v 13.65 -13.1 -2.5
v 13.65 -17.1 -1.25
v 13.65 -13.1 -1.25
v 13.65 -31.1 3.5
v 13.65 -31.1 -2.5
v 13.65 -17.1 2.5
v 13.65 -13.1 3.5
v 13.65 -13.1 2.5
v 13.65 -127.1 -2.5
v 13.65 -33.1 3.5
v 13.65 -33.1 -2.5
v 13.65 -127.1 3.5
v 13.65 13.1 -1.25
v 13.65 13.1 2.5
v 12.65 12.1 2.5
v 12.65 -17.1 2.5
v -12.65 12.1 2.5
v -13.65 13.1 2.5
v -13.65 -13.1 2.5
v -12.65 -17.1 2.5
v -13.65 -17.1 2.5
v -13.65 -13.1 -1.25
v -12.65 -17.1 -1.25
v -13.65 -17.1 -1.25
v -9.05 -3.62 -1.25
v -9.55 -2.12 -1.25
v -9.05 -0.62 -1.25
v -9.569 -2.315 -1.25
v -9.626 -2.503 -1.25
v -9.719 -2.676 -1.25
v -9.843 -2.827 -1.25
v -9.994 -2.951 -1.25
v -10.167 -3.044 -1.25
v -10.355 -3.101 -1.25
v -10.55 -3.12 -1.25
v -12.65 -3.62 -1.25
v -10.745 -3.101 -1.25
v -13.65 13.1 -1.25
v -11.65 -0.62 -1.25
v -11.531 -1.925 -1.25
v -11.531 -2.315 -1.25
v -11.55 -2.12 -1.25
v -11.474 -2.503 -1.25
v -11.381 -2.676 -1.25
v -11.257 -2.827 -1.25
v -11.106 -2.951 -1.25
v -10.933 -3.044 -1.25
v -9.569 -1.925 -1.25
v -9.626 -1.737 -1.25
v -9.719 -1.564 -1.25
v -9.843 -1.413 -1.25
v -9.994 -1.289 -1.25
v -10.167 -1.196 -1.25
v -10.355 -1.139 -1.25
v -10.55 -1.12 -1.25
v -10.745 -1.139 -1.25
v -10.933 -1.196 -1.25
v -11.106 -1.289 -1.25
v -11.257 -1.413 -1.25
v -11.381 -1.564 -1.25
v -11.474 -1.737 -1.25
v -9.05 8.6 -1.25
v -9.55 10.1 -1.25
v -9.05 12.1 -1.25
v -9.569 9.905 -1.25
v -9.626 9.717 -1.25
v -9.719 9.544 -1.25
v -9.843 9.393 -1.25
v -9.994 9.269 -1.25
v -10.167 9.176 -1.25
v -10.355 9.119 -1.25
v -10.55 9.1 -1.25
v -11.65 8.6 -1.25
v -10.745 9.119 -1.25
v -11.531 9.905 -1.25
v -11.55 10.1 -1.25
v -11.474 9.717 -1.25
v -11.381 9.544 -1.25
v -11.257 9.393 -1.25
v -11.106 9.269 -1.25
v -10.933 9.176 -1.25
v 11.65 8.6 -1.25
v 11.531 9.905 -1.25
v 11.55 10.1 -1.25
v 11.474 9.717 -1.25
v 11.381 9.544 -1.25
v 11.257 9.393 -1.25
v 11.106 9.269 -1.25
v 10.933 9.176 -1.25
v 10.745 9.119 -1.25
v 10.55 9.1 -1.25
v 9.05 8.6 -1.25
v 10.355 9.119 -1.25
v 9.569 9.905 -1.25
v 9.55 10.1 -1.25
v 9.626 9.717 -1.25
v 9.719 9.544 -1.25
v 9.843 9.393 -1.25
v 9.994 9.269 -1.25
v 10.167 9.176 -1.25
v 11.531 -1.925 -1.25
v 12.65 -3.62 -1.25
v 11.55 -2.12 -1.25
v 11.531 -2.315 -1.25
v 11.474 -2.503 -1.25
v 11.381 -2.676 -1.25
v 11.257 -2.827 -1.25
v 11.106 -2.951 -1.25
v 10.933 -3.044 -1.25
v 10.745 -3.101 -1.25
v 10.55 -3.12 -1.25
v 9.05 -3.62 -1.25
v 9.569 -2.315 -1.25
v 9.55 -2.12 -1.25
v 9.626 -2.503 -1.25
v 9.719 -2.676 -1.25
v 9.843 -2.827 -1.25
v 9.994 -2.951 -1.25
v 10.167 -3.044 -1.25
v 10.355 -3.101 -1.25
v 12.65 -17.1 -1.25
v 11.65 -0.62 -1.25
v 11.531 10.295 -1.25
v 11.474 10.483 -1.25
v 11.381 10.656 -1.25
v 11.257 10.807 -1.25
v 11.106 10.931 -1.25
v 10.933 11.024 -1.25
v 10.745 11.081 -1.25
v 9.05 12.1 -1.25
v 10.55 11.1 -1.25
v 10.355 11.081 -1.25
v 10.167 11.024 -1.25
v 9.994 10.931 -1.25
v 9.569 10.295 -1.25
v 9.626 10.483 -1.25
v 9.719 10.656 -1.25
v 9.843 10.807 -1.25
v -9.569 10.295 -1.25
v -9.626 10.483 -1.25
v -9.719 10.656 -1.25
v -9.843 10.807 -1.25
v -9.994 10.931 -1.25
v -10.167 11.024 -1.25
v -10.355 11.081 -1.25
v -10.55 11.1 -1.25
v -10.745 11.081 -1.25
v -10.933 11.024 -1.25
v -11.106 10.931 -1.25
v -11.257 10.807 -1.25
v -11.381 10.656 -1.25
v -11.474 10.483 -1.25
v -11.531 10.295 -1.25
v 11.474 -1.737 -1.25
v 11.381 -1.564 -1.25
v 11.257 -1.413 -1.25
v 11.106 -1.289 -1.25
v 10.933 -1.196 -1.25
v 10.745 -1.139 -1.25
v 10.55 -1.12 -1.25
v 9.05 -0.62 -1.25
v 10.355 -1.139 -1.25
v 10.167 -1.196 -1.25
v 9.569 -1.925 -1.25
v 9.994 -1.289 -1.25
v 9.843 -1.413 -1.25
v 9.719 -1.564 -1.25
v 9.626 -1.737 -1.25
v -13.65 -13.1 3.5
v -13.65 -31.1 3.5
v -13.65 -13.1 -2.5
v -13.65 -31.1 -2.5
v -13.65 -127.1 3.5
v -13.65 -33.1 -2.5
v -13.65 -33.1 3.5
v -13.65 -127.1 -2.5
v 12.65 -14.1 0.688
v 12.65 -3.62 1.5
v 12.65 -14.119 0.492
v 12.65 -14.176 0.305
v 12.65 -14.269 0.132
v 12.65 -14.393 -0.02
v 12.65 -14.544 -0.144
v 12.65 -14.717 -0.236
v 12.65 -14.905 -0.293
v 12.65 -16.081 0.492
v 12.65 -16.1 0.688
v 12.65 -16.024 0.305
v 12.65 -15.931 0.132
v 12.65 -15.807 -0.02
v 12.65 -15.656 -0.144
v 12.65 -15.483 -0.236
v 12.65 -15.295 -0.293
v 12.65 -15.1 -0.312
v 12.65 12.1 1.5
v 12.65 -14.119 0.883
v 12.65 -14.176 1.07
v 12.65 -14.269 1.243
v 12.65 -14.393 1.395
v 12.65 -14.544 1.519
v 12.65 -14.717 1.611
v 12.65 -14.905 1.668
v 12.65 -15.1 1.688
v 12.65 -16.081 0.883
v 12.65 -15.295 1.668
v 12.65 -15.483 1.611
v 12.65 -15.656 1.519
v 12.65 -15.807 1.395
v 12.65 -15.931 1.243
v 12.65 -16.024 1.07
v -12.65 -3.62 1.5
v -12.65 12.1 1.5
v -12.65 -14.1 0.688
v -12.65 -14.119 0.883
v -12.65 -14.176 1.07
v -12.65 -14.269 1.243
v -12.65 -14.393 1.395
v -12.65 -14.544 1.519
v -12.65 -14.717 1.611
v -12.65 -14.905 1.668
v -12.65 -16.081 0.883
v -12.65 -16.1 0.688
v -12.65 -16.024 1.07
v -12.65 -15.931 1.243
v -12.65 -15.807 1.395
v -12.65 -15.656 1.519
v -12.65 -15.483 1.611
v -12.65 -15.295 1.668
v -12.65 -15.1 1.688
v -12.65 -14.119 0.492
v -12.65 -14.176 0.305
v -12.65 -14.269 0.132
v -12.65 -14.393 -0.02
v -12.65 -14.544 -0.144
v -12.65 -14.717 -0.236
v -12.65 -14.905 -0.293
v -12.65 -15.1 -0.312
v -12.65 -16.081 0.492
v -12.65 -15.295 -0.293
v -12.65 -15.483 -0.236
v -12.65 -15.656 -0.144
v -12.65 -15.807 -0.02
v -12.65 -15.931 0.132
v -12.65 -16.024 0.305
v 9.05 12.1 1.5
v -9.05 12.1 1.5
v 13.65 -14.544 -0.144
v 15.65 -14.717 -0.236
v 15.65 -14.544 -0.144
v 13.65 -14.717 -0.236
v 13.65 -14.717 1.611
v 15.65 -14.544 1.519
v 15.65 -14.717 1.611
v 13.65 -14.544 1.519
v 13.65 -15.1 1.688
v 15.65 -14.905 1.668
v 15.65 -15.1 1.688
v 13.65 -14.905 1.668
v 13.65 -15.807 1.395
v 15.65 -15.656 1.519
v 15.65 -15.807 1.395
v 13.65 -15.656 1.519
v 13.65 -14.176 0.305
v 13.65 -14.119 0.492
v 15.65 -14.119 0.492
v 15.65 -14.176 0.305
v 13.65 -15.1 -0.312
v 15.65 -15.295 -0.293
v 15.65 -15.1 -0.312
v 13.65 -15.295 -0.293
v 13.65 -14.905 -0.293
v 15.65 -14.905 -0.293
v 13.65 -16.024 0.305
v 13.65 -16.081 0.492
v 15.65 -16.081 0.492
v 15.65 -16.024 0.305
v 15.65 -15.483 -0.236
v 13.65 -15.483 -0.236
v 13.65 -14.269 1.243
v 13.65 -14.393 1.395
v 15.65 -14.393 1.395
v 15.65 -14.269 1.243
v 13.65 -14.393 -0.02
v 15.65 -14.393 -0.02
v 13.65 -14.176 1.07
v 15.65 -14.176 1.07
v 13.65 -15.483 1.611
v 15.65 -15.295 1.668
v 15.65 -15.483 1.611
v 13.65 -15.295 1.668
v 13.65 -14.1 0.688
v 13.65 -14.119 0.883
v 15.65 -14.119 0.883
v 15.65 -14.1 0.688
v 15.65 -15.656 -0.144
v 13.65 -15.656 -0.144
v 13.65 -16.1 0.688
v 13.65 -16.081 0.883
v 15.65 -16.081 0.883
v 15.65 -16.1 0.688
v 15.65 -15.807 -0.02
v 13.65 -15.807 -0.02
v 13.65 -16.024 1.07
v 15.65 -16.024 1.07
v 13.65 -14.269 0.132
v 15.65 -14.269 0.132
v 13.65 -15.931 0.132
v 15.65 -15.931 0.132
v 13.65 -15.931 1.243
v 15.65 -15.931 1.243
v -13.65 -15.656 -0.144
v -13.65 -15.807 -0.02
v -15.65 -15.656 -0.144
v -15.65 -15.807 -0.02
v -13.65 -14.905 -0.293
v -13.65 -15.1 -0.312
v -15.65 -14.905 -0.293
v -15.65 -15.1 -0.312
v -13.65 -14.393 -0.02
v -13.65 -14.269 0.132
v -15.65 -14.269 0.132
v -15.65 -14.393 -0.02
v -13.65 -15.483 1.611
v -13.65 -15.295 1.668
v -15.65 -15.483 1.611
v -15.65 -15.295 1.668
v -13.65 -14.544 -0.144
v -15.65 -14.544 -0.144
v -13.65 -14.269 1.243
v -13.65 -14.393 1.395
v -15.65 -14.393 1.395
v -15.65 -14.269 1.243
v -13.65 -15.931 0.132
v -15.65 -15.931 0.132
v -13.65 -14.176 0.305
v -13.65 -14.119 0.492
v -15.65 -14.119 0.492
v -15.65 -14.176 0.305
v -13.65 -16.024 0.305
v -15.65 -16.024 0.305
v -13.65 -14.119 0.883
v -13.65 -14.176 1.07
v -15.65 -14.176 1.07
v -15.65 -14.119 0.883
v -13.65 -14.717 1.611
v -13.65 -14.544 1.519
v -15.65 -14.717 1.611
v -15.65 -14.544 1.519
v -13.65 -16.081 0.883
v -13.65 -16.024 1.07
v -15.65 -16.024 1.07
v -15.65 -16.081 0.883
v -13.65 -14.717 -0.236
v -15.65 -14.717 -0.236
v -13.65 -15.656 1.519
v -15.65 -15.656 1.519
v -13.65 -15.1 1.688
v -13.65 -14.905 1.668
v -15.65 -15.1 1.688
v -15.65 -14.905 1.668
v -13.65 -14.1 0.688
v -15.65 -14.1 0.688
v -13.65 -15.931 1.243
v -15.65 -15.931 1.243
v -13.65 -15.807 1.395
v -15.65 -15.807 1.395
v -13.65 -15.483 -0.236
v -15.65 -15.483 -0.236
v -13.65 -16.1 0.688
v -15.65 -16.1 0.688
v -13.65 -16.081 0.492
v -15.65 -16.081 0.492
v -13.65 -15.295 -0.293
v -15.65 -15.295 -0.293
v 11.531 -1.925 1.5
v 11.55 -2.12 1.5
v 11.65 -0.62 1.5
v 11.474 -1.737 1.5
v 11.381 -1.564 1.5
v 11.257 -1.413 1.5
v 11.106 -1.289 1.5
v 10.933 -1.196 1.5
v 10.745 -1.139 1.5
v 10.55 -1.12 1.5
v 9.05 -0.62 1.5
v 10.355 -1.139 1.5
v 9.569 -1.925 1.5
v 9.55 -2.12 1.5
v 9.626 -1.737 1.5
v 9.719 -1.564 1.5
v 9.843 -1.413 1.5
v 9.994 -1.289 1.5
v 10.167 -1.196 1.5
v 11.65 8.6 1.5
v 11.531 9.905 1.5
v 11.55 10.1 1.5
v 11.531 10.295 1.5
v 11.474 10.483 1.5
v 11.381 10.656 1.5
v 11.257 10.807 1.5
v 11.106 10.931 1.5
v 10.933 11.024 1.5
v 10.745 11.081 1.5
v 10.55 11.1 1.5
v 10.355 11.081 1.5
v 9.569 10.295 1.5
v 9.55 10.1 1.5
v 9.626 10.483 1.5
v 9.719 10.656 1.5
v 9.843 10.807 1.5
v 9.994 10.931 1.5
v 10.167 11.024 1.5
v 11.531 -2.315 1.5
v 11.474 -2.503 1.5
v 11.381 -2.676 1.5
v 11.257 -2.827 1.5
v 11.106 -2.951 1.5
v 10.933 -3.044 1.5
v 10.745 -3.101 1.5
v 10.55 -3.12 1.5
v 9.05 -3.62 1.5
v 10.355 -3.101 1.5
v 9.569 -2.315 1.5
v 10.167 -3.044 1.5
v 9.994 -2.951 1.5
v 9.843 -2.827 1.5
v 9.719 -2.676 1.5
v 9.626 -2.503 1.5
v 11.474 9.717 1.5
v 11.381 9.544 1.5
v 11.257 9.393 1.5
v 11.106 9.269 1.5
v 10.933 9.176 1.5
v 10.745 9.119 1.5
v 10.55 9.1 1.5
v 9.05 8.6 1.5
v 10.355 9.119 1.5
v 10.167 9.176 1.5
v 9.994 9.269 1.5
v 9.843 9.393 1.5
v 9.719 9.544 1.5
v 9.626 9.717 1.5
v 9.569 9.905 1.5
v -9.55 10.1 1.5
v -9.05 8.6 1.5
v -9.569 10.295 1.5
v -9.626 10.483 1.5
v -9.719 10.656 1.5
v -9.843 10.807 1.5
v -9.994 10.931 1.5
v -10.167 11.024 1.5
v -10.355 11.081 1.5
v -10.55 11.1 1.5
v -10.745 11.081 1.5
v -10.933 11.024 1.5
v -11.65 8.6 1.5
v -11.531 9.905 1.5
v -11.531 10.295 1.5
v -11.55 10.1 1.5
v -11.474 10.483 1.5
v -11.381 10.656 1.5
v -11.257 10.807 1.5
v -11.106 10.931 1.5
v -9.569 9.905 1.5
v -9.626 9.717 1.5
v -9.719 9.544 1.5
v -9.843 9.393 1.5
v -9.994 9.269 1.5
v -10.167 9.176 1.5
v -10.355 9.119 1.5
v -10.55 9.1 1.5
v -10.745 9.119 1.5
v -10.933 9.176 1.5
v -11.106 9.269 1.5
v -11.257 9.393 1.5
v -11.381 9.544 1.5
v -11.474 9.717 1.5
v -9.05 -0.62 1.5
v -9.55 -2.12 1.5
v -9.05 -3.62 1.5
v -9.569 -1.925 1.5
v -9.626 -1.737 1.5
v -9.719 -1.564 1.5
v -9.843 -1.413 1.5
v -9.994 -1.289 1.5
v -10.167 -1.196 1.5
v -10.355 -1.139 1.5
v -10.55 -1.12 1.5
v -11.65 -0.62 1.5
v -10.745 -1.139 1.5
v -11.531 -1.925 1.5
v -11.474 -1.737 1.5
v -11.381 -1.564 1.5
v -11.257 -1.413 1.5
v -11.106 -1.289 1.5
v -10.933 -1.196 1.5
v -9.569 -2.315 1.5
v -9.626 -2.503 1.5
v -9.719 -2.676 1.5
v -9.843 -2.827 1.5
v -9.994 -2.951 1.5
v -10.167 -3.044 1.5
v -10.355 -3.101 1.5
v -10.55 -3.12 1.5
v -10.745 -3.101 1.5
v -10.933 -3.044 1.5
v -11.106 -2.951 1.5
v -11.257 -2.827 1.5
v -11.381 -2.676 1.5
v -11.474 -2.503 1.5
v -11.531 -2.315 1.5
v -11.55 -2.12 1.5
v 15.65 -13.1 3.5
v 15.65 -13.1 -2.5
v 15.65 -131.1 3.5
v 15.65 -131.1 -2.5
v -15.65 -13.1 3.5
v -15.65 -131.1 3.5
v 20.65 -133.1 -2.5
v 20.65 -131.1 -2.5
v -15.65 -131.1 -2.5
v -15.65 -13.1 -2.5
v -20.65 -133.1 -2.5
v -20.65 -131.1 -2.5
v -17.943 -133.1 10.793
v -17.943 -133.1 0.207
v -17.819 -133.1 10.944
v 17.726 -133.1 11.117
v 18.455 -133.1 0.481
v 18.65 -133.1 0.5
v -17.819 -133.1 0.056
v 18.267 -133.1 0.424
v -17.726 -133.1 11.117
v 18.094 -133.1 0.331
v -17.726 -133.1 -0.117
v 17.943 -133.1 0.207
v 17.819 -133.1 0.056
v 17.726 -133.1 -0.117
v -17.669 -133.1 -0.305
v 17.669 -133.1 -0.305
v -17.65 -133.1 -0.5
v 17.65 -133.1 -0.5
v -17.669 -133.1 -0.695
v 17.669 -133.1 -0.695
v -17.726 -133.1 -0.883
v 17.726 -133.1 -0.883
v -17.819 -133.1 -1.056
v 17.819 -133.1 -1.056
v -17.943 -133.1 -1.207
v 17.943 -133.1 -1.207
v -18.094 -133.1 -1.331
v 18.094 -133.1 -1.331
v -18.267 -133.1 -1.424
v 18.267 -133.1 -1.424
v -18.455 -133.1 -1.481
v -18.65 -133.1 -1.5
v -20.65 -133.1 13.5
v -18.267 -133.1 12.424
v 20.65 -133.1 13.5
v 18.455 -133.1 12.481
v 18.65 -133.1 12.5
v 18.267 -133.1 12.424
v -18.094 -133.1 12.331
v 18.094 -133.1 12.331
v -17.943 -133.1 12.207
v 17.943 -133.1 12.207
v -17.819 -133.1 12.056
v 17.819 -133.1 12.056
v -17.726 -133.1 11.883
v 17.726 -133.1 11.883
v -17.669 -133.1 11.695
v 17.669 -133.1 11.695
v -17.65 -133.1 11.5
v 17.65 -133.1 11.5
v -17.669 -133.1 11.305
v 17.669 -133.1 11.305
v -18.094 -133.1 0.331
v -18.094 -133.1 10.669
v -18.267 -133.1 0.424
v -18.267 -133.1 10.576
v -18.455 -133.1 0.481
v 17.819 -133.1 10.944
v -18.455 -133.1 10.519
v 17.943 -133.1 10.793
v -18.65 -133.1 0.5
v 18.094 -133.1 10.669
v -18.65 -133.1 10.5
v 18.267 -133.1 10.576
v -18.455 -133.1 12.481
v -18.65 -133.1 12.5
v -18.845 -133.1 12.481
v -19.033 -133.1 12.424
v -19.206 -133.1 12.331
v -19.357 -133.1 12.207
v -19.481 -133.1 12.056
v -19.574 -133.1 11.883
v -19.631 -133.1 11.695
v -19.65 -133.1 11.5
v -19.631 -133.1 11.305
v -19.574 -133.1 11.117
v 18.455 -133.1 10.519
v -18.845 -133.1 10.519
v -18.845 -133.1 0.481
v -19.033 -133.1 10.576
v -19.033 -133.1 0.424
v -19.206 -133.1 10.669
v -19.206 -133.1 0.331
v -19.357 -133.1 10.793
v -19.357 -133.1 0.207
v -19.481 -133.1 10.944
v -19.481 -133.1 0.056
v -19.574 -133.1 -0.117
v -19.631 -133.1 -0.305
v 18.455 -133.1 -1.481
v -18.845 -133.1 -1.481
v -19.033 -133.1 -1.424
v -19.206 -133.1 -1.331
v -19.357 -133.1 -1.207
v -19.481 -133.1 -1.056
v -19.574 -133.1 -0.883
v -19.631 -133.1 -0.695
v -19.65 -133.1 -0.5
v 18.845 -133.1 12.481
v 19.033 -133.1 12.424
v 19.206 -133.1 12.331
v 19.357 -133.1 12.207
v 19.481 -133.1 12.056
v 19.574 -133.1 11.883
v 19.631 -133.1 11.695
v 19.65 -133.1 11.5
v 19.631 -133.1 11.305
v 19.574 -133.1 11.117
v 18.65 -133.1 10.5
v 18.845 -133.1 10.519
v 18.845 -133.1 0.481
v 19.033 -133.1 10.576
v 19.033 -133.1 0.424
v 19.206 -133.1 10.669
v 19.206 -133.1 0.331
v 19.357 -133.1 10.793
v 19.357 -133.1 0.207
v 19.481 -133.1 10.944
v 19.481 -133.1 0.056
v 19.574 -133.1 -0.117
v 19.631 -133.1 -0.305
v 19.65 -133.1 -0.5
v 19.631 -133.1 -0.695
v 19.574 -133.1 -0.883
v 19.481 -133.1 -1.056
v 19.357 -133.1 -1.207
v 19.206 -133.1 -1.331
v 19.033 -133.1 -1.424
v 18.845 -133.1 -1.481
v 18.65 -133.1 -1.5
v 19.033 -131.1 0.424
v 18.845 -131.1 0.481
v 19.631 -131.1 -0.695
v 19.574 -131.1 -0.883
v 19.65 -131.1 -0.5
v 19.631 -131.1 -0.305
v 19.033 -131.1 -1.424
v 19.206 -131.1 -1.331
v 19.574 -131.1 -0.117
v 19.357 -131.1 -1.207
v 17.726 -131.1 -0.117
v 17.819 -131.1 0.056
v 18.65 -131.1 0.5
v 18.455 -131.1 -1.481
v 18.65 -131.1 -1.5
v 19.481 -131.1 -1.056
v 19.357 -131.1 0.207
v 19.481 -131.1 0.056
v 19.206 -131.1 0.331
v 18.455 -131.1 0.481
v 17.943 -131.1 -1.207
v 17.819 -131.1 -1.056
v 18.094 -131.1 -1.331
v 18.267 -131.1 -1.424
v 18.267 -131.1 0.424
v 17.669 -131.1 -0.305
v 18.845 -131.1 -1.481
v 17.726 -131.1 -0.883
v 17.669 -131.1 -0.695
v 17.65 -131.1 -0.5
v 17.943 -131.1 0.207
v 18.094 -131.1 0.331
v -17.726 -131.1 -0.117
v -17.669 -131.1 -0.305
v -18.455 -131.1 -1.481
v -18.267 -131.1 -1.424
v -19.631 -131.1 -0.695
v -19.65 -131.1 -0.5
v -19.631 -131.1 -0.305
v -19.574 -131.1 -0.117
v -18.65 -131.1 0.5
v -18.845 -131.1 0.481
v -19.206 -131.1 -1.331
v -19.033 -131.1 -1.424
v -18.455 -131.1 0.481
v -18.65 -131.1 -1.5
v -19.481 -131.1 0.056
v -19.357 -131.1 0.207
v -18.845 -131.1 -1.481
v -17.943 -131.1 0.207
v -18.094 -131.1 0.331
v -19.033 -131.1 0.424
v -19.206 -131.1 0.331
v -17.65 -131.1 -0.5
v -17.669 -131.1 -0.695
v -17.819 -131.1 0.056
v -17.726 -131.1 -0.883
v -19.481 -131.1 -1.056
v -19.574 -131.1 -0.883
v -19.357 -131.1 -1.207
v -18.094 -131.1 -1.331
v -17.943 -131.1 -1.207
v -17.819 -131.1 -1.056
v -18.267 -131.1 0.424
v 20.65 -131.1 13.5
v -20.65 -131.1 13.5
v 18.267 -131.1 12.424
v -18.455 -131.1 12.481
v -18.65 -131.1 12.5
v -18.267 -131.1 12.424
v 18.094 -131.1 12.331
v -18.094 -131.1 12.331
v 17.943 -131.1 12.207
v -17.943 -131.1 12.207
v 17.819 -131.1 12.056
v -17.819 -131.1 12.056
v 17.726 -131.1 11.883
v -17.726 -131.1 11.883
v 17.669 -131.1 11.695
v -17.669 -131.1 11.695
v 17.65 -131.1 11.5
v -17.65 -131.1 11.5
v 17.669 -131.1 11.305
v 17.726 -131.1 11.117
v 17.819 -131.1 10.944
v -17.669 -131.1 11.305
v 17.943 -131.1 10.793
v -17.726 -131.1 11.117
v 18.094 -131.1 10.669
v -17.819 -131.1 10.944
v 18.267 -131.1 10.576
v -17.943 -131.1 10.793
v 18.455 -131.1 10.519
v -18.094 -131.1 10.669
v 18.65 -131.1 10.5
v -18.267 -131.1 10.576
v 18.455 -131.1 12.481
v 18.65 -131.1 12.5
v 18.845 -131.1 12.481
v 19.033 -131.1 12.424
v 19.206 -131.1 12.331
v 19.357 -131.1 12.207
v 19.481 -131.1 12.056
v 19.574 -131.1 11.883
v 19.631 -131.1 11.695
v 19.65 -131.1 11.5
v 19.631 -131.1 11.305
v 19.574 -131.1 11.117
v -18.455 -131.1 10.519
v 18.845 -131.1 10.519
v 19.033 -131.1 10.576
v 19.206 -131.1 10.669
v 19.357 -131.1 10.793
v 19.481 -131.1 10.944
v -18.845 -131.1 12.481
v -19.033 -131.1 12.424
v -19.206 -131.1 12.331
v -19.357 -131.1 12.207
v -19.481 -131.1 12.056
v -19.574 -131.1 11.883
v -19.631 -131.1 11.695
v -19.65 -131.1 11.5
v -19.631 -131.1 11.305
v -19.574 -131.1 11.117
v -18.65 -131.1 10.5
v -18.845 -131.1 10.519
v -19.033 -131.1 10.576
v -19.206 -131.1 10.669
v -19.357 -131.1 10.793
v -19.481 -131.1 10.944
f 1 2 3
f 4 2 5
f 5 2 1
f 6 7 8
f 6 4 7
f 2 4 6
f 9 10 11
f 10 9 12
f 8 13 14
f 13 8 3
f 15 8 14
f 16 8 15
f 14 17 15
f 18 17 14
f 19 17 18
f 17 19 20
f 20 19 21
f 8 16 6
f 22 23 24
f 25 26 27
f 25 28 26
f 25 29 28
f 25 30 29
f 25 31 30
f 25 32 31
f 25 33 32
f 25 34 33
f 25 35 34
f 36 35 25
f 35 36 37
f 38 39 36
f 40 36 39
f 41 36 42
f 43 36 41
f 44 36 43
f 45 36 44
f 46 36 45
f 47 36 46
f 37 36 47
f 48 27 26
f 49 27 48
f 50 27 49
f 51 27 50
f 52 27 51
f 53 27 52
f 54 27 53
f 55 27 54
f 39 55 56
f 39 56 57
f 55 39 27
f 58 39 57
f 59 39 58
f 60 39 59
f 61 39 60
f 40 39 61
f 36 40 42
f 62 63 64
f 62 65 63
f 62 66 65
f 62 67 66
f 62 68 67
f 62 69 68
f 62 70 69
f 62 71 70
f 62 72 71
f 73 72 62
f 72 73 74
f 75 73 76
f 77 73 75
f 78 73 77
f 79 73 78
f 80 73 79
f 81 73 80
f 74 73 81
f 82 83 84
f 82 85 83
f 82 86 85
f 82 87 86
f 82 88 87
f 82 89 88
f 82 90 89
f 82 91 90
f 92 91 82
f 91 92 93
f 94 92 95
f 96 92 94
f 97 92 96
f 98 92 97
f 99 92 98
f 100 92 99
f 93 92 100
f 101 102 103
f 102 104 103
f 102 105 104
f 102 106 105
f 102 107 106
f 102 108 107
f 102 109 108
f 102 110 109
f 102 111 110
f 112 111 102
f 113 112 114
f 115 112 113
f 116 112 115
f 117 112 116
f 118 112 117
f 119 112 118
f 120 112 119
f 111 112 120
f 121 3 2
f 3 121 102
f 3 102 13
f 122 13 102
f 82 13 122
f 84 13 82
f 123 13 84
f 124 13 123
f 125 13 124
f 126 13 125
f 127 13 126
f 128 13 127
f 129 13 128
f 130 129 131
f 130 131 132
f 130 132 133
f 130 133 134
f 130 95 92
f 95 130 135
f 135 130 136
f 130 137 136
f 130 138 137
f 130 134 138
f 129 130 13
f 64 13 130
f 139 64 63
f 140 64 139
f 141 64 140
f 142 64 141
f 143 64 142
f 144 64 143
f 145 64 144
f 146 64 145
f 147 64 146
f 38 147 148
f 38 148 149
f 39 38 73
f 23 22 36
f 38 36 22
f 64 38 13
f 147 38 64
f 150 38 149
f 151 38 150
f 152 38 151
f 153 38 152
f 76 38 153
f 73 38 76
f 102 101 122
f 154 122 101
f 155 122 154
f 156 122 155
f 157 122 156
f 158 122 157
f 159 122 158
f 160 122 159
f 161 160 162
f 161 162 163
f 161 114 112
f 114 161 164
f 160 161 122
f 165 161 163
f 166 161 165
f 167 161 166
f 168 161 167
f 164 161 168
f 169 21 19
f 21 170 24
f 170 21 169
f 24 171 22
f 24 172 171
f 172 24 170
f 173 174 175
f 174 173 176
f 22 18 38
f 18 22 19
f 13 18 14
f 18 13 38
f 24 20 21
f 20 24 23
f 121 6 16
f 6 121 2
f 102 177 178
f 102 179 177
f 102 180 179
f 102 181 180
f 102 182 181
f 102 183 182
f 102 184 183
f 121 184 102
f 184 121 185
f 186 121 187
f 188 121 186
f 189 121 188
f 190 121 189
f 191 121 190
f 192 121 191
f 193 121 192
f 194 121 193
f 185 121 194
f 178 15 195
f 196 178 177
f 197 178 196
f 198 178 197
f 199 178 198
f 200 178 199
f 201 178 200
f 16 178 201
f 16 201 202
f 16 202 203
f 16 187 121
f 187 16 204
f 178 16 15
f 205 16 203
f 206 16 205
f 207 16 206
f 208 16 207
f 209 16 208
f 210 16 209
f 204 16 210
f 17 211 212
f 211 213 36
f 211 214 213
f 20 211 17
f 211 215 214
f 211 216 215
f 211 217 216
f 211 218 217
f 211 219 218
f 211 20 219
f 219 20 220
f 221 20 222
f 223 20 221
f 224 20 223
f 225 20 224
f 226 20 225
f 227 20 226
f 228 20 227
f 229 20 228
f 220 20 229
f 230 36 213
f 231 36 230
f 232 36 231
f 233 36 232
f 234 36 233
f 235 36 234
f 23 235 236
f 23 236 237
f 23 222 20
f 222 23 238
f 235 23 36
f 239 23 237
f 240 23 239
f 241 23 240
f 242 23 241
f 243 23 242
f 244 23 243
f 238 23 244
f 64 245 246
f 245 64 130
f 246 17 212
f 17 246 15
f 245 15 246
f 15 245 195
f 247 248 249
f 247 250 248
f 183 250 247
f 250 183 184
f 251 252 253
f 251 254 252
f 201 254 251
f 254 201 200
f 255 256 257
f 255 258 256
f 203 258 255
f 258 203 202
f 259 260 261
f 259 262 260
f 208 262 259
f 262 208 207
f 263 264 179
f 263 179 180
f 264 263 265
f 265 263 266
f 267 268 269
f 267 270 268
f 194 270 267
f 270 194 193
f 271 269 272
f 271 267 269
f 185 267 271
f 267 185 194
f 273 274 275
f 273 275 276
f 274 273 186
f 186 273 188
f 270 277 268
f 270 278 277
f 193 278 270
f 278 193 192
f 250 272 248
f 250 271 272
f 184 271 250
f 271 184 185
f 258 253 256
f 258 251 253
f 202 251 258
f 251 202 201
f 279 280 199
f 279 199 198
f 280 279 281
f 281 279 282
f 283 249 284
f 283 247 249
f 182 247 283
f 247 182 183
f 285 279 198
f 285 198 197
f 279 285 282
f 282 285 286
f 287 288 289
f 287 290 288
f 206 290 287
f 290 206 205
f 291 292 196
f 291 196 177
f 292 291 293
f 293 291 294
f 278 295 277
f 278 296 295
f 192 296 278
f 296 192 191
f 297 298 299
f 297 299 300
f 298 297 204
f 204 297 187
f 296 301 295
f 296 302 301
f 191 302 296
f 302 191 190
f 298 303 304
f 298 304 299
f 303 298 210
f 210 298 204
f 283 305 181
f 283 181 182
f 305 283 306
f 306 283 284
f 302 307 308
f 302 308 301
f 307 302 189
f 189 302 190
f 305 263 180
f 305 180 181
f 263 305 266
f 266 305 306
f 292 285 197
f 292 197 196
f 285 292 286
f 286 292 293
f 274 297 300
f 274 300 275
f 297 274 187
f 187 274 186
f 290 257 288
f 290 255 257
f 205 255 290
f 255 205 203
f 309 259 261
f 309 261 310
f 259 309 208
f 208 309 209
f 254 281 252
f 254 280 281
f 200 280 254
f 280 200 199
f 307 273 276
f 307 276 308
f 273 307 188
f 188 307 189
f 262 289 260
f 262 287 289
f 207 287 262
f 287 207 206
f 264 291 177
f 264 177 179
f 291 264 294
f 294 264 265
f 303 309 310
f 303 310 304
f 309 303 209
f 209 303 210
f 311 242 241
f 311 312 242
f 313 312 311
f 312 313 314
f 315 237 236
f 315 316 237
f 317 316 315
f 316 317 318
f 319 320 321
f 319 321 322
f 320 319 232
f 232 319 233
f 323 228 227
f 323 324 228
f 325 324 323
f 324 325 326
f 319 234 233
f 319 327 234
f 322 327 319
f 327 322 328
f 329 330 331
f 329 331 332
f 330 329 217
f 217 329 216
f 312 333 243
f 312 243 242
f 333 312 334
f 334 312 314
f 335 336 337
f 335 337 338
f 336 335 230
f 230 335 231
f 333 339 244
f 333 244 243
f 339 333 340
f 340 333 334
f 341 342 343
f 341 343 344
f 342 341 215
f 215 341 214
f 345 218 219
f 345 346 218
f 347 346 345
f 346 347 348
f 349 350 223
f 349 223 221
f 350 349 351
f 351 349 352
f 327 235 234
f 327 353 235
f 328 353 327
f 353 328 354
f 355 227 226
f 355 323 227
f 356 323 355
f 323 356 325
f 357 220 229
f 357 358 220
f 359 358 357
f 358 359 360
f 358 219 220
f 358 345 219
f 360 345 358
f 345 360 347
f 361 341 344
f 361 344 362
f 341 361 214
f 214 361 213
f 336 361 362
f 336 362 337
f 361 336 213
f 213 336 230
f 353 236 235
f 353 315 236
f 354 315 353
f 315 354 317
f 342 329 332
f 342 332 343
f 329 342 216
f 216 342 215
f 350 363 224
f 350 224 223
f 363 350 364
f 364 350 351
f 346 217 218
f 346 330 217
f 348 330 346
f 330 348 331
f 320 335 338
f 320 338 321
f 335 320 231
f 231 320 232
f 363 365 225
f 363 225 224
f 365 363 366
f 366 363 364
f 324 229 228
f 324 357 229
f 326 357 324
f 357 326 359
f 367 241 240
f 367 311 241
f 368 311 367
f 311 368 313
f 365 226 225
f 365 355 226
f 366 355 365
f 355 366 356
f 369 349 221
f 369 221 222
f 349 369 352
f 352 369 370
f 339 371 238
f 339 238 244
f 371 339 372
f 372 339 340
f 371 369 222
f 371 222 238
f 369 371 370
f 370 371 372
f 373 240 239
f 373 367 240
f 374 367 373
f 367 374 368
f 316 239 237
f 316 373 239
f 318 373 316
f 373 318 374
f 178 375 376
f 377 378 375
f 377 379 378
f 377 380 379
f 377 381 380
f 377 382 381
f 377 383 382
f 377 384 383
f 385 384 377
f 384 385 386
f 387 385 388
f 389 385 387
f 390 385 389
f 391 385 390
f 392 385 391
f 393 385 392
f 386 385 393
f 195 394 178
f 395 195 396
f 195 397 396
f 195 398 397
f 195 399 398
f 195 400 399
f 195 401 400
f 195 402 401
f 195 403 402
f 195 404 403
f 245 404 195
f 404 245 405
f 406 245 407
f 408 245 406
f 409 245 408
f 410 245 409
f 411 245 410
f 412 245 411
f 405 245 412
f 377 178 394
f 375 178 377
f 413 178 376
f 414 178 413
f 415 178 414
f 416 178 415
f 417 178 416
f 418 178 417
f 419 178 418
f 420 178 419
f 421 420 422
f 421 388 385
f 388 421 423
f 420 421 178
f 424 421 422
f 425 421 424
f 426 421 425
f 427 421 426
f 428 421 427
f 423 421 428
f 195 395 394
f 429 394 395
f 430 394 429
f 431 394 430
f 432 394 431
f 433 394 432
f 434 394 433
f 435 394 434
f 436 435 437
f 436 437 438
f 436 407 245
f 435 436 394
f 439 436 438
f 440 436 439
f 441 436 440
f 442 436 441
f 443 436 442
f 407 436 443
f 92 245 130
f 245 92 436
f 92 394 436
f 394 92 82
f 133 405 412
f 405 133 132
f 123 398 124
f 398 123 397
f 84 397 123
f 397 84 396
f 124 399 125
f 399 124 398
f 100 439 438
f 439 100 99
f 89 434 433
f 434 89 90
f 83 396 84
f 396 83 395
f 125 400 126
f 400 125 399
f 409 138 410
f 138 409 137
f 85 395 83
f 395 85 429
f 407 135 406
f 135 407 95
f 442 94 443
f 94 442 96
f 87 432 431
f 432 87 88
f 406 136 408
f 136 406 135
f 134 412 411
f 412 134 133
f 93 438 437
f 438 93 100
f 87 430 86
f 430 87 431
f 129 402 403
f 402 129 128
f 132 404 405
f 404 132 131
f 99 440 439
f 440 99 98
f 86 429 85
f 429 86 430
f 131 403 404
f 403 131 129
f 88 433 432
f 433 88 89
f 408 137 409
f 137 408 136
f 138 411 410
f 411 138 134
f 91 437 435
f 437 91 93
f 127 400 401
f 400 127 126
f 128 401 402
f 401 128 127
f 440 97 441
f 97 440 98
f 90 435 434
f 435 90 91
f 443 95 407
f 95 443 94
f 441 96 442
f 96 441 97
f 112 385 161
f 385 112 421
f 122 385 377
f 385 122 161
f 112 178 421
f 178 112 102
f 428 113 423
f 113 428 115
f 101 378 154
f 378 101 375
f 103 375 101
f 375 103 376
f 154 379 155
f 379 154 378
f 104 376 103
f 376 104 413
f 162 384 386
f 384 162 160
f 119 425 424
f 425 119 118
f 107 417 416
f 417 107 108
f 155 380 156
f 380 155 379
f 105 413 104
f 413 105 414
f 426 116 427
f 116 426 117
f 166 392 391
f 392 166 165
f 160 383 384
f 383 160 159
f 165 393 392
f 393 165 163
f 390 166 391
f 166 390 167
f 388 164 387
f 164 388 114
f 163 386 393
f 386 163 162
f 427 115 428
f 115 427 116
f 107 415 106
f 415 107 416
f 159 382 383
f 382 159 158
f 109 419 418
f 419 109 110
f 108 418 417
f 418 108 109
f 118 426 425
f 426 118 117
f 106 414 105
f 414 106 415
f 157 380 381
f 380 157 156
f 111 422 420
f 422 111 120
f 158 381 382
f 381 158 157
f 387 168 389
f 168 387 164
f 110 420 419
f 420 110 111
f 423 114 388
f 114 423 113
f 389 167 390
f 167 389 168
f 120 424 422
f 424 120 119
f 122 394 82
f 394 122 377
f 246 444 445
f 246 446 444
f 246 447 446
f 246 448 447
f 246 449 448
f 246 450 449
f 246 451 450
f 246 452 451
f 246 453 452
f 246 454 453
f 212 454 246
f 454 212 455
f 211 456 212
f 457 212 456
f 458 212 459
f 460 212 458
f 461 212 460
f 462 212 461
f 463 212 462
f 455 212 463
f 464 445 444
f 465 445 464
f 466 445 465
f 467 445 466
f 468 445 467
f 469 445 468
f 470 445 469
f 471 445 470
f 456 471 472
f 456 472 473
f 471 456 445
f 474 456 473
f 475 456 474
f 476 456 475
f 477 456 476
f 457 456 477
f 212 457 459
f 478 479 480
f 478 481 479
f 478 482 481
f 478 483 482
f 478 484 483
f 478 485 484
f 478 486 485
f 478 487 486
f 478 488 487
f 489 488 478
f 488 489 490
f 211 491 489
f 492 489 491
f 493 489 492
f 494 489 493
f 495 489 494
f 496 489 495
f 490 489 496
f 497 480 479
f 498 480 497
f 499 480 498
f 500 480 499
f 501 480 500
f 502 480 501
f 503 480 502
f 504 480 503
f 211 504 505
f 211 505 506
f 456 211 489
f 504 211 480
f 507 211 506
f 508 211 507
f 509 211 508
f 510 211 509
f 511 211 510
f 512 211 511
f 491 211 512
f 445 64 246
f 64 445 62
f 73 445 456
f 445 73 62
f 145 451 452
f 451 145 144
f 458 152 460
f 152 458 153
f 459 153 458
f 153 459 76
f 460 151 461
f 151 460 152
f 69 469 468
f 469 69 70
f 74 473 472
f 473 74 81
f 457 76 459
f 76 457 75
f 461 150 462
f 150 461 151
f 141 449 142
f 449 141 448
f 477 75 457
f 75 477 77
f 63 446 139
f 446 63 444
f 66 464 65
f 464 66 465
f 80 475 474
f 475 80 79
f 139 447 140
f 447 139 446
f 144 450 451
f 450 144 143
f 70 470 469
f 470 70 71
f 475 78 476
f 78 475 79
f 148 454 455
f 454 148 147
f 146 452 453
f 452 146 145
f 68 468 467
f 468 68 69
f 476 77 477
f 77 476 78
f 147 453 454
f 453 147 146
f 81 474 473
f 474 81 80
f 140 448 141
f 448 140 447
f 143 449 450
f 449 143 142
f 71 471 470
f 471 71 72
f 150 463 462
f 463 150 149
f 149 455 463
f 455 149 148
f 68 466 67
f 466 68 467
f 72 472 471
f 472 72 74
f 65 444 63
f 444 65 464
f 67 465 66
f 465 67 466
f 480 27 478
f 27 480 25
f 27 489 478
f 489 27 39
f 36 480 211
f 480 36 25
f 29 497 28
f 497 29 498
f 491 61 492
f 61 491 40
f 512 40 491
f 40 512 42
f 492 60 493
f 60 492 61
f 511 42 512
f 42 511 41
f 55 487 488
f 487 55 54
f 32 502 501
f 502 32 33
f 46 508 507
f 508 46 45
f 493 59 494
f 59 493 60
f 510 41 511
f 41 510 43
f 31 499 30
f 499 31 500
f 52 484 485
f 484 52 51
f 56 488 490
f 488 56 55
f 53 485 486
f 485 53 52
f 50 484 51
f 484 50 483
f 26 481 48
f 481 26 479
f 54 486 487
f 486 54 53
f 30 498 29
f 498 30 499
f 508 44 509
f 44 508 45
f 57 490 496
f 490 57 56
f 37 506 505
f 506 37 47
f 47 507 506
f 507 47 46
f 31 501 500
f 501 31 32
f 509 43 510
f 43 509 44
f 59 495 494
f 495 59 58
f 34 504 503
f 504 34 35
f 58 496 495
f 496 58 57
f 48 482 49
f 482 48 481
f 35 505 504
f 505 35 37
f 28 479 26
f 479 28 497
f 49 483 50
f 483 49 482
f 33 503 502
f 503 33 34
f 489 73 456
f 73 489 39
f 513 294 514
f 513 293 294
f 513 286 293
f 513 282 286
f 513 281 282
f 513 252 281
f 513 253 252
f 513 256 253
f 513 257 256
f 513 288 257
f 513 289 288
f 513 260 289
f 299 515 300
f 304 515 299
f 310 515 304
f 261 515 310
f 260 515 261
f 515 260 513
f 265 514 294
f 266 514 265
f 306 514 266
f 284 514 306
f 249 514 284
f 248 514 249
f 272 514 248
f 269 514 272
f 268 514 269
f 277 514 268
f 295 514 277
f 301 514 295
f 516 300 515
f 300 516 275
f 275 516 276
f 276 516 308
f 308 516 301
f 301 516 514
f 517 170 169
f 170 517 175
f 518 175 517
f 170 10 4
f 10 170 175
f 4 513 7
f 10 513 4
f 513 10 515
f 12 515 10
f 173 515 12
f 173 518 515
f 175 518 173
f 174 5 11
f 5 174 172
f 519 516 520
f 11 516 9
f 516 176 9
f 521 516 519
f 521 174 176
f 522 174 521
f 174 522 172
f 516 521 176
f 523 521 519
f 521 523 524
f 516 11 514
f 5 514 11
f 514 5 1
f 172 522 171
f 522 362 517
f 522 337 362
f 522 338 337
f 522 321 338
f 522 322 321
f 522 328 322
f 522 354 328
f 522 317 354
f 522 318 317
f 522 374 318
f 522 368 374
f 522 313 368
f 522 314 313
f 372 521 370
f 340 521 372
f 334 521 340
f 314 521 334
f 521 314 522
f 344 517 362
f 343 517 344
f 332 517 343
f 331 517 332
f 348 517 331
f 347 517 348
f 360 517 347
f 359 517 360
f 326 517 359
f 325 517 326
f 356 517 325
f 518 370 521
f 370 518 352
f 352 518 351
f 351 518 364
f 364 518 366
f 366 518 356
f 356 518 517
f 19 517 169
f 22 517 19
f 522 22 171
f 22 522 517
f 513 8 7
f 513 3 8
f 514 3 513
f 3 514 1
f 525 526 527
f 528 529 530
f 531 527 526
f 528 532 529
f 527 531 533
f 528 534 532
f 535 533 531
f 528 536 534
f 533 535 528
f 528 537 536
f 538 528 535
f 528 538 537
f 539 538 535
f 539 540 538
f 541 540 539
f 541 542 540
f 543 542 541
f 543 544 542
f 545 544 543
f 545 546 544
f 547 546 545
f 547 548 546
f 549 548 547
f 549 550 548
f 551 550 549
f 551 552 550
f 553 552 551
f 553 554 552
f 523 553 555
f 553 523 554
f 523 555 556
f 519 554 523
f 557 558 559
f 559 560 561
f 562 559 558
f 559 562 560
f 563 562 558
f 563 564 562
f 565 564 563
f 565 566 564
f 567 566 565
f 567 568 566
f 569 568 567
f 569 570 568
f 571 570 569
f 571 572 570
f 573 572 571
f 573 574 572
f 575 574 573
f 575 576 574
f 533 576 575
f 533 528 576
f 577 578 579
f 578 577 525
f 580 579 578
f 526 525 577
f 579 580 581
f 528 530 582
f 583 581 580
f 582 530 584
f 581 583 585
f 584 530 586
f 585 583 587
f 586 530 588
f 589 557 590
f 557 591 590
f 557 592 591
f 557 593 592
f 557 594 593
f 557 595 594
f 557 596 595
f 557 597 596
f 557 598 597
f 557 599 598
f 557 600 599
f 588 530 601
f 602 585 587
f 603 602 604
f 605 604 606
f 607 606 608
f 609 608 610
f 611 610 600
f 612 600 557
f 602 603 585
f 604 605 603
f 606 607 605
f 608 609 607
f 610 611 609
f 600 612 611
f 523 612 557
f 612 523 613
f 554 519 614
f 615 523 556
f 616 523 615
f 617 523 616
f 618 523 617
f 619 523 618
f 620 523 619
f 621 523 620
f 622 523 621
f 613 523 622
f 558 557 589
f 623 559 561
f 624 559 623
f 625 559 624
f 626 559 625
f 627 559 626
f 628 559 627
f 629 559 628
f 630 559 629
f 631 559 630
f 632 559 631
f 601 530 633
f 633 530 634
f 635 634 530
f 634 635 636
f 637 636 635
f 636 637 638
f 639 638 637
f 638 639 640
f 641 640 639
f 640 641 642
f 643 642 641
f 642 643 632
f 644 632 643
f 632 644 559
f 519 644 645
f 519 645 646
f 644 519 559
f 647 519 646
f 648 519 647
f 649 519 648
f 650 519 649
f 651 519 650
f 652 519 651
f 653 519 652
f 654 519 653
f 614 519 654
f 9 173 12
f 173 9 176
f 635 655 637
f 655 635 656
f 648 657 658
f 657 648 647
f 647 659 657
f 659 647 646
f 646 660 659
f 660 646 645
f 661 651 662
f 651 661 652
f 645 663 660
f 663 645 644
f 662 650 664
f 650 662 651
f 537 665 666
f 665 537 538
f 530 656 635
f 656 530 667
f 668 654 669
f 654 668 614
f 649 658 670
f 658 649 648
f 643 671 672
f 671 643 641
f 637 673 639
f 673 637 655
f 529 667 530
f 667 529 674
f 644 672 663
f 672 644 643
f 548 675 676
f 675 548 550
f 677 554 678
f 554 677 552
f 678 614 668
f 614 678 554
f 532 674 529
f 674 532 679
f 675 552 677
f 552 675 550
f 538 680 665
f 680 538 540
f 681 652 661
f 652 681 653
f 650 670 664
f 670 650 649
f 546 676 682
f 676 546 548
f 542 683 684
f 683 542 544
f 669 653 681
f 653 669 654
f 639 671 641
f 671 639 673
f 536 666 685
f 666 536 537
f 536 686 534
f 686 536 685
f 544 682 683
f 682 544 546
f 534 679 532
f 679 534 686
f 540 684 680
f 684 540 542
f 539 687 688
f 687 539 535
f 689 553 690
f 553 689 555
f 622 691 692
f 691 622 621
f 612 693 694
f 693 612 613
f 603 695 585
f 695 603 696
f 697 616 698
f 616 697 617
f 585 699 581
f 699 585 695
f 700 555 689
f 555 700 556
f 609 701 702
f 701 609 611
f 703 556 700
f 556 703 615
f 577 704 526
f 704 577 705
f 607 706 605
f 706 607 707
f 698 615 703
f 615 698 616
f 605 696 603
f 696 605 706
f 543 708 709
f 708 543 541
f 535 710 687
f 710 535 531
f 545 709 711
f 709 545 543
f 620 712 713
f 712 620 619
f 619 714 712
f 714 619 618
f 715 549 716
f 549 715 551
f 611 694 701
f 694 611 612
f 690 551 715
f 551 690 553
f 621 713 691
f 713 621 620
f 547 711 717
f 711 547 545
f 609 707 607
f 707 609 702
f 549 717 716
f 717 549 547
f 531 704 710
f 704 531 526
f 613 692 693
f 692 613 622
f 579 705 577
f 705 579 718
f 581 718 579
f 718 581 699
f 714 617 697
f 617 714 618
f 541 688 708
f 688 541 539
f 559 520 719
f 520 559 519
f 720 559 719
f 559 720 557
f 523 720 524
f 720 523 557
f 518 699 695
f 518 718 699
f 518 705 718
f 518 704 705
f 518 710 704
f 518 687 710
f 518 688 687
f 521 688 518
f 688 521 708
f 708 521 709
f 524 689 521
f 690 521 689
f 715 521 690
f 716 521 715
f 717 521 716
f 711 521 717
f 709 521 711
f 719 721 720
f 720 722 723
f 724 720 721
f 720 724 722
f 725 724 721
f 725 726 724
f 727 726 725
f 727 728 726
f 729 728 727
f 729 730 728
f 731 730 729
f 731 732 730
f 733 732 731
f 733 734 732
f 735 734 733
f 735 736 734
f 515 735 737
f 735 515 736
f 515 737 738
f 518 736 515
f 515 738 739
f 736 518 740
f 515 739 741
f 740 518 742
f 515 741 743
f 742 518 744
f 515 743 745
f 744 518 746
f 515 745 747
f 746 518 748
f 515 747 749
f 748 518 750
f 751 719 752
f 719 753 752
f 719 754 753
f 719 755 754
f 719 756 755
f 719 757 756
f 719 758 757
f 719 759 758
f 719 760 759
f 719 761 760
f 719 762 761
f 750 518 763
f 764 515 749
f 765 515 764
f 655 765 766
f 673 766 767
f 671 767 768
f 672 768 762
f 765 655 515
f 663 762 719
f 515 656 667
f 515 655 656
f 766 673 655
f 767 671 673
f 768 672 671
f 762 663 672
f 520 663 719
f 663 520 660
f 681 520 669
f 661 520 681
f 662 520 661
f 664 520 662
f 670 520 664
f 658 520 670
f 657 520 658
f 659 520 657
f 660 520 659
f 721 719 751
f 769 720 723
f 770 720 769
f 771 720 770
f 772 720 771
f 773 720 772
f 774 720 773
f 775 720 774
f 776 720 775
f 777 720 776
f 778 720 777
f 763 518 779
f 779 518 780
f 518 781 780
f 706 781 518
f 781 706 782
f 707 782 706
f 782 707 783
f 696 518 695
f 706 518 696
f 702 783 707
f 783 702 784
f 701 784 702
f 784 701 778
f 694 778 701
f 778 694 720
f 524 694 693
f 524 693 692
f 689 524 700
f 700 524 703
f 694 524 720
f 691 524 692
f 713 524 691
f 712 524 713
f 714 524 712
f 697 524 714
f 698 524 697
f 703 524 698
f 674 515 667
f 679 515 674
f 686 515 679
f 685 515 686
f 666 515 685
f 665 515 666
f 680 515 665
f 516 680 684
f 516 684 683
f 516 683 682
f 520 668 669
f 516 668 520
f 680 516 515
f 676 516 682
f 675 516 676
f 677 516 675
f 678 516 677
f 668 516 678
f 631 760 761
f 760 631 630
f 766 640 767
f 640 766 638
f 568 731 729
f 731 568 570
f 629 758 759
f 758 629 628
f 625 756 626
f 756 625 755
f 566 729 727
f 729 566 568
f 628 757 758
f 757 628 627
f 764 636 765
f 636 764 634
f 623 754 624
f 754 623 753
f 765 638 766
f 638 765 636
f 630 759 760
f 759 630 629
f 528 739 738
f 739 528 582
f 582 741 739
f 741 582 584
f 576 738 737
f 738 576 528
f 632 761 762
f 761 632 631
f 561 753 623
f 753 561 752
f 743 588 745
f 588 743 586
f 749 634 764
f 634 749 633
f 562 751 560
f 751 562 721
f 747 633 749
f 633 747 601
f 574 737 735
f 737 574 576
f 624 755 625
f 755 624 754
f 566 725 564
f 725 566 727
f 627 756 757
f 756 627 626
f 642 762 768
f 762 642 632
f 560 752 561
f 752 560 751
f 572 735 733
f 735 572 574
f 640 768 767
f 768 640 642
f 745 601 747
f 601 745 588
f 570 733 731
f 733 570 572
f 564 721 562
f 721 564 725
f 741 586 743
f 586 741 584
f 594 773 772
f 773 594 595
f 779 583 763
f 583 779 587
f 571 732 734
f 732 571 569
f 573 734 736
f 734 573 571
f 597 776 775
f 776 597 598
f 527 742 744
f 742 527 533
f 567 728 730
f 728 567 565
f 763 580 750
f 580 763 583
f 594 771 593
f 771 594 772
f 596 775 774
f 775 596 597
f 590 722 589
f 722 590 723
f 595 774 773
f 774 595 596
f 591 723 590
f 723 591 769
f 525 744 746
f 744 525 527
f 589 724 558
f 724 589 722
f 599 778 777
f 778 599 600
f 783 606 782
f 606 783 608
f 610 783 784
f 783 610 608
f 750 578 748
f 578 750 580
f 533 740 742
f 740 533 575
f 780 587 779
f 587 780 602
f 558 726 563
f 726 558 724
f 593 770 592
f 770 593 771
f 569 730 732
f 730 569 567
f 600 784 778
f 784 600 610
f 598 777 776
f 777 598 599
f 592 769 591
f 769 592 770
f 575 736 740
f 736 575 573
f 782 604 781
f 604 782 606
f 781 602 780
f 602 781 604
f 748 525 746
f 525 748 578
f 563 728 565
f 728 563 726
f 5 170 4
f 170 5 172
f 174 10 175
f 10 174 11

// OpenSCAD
CAMERA_WIDTH = 25.3;
CAMERA_LENGTH = 24.2;
CAMERA_PCB_HEIGHT = 1.7;
CAMERA_PCB_AND_RIBBON_HEIGHT = 4.45;

TOP_THROUGH_HOLE_MARGIN = 1;
THROUGH_HOLE_RADIUS = 1;

// Lens is a box shape
LENS_SIZE = 8.7;
LENS_OFFSET_Y = 11.7;

// Depth of back enclosure + PCB
BACK_AND_PCB_DEPTH = 5.6;

MOUNTING_SPACE = 4;
MOUNTING_SCREW_DIAMETER = 2;

// translate([0, 0, 2]) {
//     difference() {
//         cube([CAMERA_WIDTH, CAMERA_LENGTH, 1], center=true);

//         translate([0, CAMERA_LENGTH/2 - LENS_SIZE/2 - LENS_OFFSET_Y + 1.5, 0]) {
//             cube([LENS_SIZE, LENS_SIZE, 2], center=true);
//         }
//     }
// }


pcb_leeway = CAMERA_PCB_AND_RIBBON_HEIGHT - CAMERA_PCB_HEIGHT;
chasis_depth = pcb_leeway + 1;

module mounting_screw_hole_left() {
    translate([CAMERA_WIDTH/2, -CAMERA_LENGTH/2 - MOUNTING_SPACE/2 - 1, chasis_depth/4 - 0.25]) {
        rotate([0, 90, 0]) {
            cylinder(3, MOUNTING_SCREW_DIAMETER/2, MOUNTING_SCREW_DIAMETER/2, center=true, $fn=32);
        }
    }
}

difference() {
    translate([0, -MOUNTING_SPACE/2, 2.5 - (pcb_leeway + 1)/2]) {
        cube([CAMERA_WIDTH + 2, CAMERA_LENGTH + 2 + MOUNTING_SPACE, pcb_leeway + 1], center=true);
    }
    translate([0, 0, 2.5 - (pcb_leeway + 1)/2]) {
        cube([CAMERA_WIDTH, CAMERA_LENGTH, pcb_leeway + 2], center=true);
    }
    translate([0, -5 - MOUNTING_SPACE/2, 2.5 - (pcb_leeway + 1)/2]) {
        cube([CAMERA_WIDTH, CAMERA_LENGTH + MOUNTING_SPACE, pcb_leeway + 2], center=true);
    }
    mounting_screw_hole_left();
    mirror([1, 0, 0]) {
        mounting_screw_hole_left();
    }
}




peg_length = pcb_leeway + 2 + CAMERA_PCB_HEIGHT;
peg_length_diff = peg_length - pcb_leeway;

module standoffs() {
    translate([CAMERA_WIDTH/2 - 0.5, 4, pcb_leeway/2 - 1.25]) {
        cube([1, 14, pcb_leeway], center=true);
    }

    difference() {
        translate([CAMERA_WIDTH/2 - 1.6, CAMERA_LENGTH/2 - 1.5, pcb_leeway/2 - 1.25]) {
            cube([4, 4, pcb_leeway], center=true);
        }

        translate([CAMERA_WIDTH/2 - THROUGH_HOLE_RADIUS - TOP_THROUGH_HOLE_MARGIN - 0.1, CAMERA_LENGTH/2 - THROUGH_HOLE_RADIUS - TOP_THROUGH_HOLE_MARGIN, peg_length/2 - 1.25 - peg_length_diff]) {
            cylinder(peg_length, THROUGH_HOLE_RADIUS, THROUGH_HOLE_RADIUS, center=true, $fn=32);
        }
    }

    difference() {
        translate([CAMERA_WIDTH/2 - 1.6, CAMERA_LENGTH/2 - 1 - 13.22, pcb_leeway/2 - 1.25]) {
            cube([4, 3, pcb_leeway], center=true);
        }

        translate([CAMERA_WIDTH/2 - THROUGH_HOLE_RADIUS - TOP_THROUGH_HOLE_MARGIN - 0.1, CAMERA_LENGTH/2 - THROUGH_HOLE_RADIUS - 13.22, peg_length/2 - 1.25 - peg_length_diff]) {
            cylinder(peg_length, THROUGH_HOLE_RADIUS, THROUGH_HOLE_RADIUS, center=true, $fn=32);
        }
    }
}

standoffs();

mirror([1, 0, 0]) {
    standoffs();
}


STAND_HEIGHT = 120;
STAND_DEPTH = 6;

difference() {
    translate([0, -CAMERA_LENGTH/2 - MOUNTING_SPACE/2 + 1 + -STAND_HEIGHT/2, 2- STAND_DEPTH/4]) {
        difference() {
            cube([CAMERA_WIDTH + 6, STAND_HEIGHT, STAND_DEPTH], center=true);
            translate([0, 4, 0]) {
                cube([CAMERA_WIDTH + 2, STAND_HEIGHT - 4, STAND_DEPTH + 1], center=true);
            }
        }
    }
    translate([2, 0, 0]) {
        mounting_screw_hole_left();
    }
    
    mirror([1, 0, 0]) {
        translate([2, 0, 0]) {
            mounting_screw_hole_left();
        }
    }
}

module stand_screw_hole() {
    translate([CAMERA_WIDTH/2 + 6, 0, (STAND_DEPTH + 10)/2 - 2]) {
        rotate([90, 0, 0]) {
            cylinder(3, MOUNTING_SCREW_DIAMETER/2, MOUNTING_SCREW_DIAMETER/2, center=true, $fn=32);
        }
    }
}

translate([0, -MOUNTING_SPACE -CAMERA_LENGTH/2  - 16, 2- STAND_DEPTH/4]) {
    cube([CAMERA_WIDTH + 4, 2, STAND_DEPTH], center=true);
}

translate([0, -STAND_HEIGHT -CAMERA_LENGTH/2, 2- STAND_DEPTH/4 + 5]) {

    // Stand
    difference() {
        cube([CAMERA_WIDTH + 16, 2, STAND_DEPTH + 10], center=true);
        stand_screw_hole();
        mirror([1, 0, 0]) {
            stand_screw_hole();
        }
        mirror([0, 0, 1]) {
            stand_screw_hole();
            mirror([1, 0, 0]) {
                stand_screw_hole();
            }   
        }
    }
}
